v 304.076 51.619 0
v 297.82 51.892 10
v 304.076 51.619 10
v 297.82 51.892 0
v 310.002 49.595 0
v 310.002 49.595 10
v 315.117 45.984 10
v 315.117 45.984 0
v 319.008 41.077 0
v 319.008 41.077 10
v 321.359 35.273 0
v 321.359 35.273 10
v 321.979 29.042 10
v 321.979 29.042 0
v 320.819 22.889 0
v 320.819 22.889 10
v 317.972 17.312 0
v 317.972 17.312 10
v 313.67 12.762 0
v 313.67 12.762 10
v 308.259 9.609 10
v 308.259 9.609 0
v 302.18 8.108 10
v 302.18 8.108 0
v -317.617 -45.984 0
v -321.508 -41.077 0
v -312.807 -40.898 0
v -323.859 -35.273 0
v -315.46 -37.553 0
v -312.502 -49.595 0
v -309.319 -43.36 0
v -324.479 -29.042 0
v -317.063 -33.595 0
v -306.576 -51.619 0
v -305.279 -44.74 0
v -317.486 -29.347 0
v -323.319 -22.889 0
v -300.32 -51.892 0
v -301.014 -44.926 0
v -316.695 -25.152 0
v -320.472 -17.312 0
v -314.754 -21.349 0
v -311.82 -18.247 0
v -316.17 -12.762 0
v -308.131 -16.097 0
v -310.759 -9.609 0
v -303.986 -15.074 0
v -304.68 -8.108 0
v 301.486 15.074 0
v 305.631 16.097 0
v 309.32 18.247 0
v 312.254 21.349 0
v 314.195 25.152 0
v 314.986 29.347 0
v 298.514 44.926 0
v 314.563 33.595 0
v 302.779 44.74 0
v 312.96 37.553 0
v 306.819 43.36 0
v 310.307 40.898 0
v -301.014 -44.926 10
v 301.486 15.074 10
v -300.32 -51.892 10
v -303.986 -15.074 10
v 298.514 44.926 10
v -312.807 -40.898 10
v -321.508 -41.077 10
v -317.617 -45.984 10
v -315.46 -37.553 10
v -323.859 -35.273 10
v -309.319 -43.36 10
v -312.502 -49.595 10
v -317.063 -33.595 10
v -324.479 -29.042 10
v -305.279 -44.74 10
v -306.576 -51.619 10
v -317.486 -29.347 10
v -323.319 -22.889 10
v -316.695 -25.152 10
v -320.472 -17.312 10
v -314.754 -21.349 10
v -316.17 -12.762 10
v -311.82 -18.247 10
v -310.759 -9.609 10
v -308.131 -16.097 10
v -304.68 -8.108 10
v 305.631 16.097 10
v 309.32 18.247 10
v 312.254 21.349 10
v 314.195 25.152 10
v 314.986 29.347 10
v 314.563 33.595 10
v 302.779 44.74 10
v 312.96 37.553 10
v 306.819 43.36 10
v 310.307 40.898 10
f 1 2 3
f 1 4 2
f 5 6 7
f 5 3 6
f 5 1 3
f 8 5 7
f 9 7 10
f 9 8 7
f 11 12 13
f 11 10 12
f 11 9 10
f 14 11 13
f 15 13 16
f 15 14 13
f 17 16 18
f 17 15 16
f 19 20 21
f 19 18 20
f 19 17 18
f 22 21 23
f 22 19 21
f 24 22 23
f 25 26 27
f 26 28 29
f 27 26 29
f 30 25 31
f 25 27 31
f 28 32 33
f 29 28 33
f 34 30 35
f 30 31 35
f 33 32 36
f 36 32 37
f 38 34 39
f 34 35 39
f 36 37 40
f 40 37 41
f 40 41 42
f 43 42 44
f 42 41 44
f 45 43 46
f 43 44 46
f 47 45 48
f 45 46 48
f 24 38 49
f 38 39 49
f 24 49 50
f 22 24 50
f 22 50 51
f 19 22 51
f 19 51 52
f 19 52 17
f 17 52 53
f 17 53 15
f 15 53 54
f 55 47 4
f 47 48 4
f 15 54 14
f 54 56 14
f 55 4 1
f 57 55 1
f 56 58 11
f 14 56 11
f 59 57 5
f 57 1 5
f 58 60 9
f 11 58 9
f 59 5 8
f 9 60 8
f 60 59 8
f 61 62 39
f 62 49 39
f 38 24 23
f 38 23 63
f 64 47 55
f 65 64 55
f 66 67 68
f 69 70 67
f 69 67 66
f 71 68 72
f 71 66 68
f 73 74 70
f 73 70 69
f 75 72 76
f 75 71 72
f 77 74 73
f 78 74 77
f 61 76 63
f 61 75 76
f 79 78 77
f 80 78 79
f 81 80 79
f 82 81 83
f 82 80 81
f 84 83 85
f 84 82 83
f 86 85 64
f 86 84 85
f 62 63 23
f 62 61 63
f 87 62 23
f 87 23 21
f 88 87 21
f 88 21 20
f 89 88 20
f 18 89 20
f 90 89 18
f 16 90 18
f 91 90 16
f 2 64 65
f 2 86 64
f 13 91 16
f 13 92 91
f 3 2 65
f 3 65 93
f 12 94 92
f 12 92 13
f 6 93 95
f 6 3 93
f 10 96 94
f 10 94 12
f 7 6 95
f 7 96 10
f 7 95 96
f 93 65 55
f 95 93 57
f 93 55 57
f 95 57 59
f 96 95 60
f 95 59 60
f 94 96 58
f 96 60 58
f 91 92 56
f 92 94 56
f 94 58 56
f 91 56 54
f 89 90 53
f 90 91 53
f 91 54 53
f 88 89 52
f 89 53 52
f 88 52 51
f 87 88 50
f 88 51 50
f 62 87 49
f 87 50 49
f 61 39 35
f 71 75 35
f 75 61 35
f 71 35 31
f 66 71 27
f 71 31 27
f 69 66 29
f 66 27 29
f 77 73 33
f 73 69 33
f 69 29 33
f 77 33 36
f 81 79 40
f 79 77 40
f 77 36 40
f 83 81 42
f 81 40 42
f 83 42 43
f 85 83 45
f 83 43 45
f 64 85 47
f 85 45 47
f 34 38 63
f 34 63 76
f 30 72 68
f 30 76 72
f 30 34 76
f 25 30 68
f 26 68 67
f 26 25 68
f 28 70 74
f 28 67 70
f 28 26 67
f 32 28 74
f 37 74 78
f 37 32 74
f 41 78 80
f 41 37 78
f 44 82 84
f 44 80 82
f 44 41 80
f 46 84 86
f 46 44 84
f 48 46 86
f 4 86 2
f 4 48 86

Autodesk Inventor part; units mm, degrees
ref_plane "YZ Plane" through (0, 0, 0) normal (1, 0, 0) x (0, 1, 0)
ref_plane "XZ Plane" through (0, 0, 0) normal (0, 1, 0) x (-1, 0, 0)
ref_plane "XY Plane" through (0, 0, 0) normal (0, 0, 1) x (1, 0, 0)
sketch "Boceto1" plane through (0, 0, 0) normal (0, 0, 1) x (1, 0, 0)
  arc A0 (-303.9864, -15.0738) -> (-301.0136, -44.9262) centre (-302.5, -30) ccw
  arc A1 (301.4864, 15.0738) -> (298.5136, 44.9262) centre (300, 30) ccw
  line L0 (-303.9864, -15.0738) -> (298.5136, 44.9262)
  line L1 (301.4864, 15.0738) -> (-301.0136, -44.9262)
  line L2 (-361.4241, -13.7591) -> (297.8199, 51.8917)
  arc A2 (302.1801, 8.1083) -> (297.8199, 51.8917) centre (300, 30) ccw
  line L3 (302.1801, 8.1083) -> (-300.3199, -51.8917)
  arc A3 (-304.6801, -8.1083) -> (-300.3199, -51.8917) centre (-302.5, -30) ccw
  point P0 (0, 0)
  dimension "d0" = 30
  dimension "d1" = 30
  dimension "d2" = 300
  dimension "d3" = 302.5
  dimension "d4" = 30
  dimension "d5" = 30
  dimension "d6" = 7
  dimension "d8" = 7
extrude "Extrusión1" add sketch "Boceto1" along normal blind 10
properties part number "faja"
